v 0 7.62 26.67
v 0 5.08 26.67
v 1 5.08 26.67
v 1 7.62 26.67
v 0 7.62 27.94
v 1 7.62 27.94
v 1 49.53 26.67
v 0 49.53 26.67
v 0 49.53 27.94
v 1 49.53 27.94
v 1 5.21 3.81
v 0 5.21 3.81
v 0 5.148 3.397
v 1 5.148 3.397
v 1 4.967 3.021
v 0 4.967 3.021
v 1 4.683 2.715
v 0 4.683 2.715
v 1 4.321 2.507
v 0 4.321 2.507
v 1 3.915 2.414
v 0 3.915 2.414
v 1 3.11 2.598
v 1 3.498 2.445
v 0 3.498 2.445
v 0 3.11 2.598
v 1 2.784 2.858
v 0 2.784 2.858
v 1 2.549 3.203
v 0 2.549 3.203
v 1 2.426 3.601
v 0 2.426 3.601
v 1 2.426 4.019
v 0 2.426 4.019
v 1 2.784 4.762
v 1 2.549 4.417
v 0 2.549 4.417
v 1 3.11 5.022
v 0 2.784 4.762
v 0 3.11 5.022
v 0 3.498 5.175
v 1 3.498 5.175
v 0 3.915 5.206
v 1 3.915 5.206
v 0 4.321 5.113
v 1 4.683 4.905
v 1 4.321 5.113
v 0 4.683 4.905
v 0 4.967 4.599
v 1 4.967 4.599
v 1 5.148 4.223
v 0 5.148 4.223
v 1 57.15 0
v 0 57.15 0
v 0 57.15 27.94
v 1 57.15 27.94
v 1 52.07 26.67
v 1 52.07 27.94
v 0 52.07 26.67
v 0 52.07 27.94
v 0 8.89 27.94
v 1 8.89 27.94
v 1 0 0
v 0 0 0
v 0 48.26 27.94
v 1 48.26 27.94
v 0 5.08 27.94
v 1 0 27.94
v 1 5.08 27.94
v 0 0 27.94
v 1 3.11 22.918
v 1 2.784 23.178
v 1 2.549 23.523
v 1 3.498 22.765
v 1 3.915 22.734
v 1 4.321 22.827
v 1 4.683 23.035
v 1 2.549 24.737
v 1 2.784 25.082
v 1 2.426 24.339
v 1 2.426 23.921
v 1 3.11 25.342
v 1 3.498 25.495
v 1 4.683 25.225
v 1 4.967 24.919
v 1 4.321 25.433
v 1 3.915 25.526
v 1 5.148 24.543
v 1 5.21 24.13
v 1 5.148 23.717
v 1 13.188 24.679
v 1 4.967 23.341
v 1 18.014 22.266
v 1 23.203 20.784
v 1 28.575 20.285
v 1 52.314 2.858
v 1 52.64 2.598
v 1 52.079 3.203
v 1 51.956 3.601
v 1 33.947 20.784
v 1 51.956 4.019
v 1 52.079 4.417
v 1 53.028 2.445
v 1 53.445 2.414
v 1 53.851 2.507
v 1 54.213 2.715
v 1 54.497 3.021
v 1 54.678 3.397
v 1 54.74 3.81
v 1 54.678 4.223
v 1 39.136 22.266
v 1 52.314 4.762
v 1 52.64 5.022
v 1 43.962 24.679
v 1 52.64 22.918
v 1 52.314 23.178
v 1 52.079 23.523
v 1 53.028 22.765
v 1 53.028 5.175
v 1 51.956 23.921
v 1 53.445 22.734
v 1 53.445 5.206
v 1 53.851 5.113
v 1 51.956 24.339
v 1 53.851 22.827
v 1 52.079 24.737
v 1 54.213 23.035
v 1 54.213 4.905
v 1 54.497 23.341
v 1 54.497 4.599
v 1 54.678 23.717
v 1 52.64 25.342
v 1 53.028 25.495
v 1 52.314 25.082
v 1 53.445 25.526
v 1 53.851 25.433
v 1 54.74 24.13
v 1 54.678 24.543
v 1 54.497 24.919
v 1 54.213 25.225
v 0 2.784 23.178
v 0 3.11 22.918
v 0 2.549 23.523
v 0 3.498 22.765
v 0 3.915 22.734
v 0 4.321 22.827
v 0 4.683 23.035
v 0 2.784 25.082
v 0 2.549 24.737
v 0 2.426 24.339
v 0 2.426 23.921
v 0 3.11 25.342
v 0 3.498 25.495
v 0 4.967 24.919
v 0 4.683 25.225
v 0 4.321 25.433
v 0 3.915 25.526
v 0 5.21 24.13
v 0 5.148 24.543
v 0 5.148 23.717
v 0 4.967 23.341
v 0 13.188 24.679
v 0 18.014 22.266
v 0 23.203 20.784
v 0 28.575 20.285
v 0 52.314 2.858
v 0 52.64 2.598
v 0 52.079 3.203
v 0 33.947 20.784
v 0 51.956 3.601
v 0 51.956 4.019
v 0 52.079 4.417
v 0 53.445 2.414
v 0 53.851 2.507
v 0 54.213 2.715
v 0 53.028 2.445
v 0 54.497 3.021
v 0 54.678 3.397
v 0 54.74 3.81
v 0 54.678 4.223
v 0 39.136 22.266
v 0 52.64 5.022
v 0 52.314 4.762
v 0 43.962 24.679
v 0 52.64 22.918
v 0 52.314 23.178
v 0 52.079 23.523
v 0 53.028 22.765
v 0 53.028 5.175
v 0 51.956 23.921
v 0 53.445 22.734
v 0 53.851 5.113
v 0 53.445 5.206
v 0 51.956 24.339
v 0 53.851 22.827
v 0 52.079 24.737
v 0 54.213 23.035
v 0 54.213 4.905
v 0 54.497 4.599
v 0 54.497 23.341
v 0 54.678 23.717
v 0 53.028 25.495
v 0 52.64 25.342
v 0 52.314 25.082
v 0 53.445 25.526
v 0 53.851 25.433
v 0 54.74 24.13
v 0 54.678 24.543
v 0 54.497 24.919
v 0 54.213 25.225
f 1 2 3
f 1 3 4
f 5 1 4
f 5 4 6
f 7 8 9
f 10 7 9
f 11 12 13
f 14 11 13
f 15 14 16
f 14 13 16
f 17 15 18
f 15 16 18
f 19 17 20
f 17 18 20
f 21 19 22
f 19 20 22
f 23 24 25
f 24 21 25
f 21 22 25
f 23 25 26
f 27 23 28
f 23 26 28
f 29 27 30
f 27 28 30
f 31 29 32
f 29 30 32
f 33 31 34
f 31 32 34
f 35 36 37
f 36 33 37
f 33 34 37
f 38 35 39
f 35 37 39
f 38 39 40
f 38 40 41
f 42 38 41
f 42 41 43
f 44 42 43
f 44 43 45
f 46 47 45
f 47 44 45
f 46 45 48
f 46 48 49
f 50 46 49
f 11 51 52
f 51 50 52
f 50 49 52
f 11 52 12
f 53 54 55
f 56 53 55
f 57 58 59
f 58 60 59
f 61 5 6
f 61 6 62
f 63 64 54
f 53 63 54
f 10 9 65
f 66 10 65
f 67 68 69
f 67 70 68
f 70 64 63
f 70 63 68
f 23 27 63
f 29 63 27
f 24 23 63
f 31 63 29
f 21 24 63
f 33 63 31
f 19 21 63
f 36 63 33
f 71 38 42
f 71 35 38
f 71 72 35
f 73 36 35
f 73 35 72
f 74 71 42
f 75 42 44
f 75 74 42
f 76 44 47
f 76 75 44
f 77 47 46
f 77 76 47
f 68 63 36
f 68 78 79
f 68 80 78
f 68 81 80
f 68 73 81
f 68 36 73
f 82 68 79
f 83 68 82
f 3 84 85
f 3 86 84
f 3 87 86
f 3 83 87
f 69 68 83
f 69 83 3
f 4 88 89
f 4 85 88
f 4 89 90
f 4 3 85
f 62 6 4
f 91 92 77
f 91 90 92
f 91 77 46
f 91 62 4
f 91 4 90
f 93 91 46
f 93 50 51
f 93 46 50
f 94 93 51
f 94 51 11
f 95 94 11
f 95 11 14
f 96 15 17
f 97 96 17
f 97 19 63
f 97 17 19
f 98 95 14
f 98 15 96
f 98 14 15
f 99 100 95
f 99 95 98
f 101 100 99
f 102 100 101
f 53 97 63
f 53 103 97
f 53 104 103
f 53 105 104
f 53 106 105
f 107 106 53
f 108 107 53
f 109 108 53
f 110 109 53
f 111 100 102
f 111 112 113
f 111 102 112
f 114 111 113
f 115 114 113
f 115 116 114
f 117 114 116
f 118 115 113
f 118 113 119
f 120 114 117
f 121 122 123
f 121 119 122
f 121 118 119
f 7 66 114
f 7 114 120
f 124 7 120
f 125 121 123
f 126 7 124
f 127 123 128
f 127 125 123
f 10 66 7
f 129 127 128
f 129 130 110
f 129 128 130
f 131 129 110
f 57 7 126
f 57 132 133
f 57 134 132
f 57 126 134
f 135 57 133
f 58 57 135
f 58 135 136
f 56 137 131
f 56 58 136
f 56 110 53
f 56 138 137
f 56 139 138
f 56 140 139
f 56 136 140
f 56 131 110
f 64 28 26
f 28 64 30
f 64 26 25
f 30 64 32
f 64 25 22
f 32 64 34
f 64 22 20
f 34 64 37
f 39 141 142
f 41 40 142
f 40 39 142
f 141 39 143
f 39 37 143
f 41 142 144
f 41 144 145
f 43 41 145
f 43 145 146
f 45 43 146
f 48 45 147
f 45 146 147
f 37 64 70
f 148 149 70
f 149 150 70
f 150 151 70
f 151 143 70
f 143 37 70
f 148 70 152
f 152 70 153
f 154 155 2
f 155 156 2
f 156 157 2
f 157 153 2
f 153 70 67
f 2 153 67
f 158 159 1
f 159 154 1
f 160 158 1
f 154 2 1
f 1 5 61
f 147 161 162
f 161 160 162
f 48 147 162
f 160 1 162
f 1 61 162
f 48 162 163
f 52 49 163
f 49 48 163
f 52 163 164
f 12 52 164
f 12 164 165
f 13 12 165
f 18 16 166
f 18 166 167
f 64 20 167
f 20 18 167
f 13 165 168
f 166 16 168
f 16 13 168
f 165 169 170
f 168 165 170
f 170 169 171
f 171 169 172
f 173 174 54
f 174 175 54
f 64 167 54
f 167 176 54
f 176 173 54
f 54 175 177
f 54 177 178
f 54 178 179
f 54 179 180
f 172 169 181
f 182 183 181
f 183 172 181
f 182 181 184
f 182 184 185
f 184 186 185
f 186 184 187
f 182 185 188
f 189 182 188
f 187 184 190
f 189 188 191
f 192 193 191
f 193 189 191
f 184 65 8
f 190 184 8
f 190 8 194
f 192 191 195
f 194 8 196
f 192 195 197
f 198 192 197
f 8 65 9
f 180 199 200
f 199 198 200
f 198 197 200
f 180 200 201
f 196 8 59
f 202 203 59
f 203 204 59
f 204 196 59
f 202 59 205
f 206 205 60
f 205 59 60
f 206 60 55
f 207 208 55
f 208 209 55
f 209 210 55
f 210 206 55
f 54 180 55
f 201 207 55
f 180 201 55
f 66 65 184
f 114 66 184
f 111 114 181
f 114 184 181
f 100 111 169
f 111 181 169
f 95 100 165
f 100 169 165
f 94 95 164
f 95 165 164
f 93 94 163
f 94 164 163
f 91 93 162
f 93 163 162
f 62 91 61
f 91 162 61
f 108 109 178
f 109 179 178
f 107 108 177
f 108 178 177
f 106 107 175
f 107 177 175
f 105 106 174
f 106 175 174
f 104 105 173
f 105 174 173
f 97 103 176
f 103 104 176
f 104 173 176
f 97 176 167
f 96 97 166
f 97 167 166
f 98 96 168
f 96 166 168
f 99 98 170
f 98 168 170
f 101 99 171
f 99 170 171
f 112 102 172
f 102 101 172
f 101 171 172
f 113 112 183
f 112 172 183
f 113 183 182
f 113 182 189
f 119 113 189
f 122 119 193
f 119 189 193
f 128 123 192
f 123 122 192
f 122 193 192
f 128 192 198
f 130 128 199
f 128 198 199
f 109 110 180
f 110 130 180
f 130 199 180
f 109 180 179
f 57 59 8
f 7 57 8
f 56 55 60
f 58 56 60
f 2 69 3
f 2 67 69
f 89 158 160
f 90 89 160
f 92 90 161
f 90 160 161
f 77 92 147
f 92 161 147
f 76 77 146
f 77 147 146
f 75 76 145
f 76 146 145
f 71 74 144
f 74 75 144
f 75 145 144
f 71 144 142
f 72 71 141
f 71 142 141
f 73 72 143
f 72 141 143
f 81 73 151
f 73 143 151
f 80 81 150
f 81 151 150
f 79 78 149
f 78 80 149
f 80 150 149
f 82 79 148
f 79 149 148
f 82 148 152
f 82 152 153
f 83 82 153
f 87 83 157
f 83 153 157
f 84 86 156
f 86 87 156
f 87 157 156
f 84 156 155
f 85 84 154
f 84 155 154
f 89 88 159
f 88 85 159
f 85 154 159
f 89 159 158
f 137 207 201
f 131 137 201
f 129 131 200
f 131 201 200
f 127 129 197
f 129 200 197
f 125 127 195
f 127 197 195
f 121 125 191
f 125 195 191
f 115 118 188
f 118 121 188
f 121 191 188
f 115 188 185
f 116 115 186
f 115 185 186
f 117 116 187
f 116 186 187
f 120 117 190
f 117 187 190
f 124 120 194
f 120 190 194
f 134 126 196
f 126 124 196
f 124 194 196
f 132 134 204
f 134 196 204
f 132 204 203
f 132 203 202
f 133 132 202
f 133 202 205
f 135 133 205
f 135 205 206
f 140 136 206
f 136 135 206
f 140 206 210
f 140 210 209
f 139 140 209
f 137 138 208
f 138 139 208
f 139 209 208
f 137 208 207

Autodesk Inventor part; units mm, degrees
ref_plane "YZ Plane" through (0, 0, 0) normal (1, 0, 0) x (0, 1, 0)
ref_plane "XZ Plane" through (0, 0, 0) normal (0, 1, 0) x (-1, 0, 0)
ref_plane "XY Plane" through (0, 0, 0) normal (0, 0, 1) x (1, 0, 0)
sketch "Sketch1" plane through (0, 0, 0) normal (1, 0, 0) x (0, 1, 0)
  line L0 (0, 0) -> (57.15, 0)
  line L1 (57.15, 0) -> (57.15, 27.94)
  line L2 (0, 0) -> (0, 27.94)
  arc A0 (8.89, 27.94) -> (48.26, 27.94) centre (28.575, 49.4224) ccw
  line L3 (28.575, 0) -> (28.575, 8.5438) construction
  circle A1 centre (3.81, 3.81) radius 1.4
  circle A2 centre (53.34, 3.81) radius 1.4
  line L4 (0, 27.94) -> (5.08, 27.94)
  line L5 (5.08, 27.94) -> (5.08, 26.67)
  line L6 (5.08, 26.67) -> (7.62, 26.67)
  line L7 (7.62, 26.67) -> (7.62, 27.94)
  line L8 (7.62, 27.94) -> (8.89, 27.94)
  line L9 (57.15, 27.94) -> (52.07, 27.94)
  line L10 (52.07, 27.94) -> (52.07, 26.67)
  line L11 (52.07, 26.67) -> (49.53, 26.67)
  line L12 (49.53, 26.67) -> (49.53, 27.94)
  line L13 (49.53, 27.94) -> (48.26, 27.94)
  circle A3 centre (53.34, 24.13) radius 1.4
  circle A4 centre (3.81, 24.13) radius 1.4
  dimension "d0" = 57.15
  dimension "d1" = 27.94
  dimension "d2" = 27.94
  dimension "d3" = 85
  dimension "d4" = 29.1375
  dimension "d5" = 2.8
  dimension "d6" = 3.81
  dimension "d7" = 3.81
  dimension "d8" = 5.08
  dimension "d9" = 1.27
  dimension "d10" = 2.54
  dimension "d11" = 1.27
  dimension "d14" = 2.8
  dimension "d15" = 20.32
  dimension "d16" = 49.4224
  dimension "d17" = 8.89
  dimension "d18" = 49.53
extrude "Extrusion1" add sketch "Sketch1" along normal blind 1
properties part number "PCBModuleLeft01" material "PCB(1)"
